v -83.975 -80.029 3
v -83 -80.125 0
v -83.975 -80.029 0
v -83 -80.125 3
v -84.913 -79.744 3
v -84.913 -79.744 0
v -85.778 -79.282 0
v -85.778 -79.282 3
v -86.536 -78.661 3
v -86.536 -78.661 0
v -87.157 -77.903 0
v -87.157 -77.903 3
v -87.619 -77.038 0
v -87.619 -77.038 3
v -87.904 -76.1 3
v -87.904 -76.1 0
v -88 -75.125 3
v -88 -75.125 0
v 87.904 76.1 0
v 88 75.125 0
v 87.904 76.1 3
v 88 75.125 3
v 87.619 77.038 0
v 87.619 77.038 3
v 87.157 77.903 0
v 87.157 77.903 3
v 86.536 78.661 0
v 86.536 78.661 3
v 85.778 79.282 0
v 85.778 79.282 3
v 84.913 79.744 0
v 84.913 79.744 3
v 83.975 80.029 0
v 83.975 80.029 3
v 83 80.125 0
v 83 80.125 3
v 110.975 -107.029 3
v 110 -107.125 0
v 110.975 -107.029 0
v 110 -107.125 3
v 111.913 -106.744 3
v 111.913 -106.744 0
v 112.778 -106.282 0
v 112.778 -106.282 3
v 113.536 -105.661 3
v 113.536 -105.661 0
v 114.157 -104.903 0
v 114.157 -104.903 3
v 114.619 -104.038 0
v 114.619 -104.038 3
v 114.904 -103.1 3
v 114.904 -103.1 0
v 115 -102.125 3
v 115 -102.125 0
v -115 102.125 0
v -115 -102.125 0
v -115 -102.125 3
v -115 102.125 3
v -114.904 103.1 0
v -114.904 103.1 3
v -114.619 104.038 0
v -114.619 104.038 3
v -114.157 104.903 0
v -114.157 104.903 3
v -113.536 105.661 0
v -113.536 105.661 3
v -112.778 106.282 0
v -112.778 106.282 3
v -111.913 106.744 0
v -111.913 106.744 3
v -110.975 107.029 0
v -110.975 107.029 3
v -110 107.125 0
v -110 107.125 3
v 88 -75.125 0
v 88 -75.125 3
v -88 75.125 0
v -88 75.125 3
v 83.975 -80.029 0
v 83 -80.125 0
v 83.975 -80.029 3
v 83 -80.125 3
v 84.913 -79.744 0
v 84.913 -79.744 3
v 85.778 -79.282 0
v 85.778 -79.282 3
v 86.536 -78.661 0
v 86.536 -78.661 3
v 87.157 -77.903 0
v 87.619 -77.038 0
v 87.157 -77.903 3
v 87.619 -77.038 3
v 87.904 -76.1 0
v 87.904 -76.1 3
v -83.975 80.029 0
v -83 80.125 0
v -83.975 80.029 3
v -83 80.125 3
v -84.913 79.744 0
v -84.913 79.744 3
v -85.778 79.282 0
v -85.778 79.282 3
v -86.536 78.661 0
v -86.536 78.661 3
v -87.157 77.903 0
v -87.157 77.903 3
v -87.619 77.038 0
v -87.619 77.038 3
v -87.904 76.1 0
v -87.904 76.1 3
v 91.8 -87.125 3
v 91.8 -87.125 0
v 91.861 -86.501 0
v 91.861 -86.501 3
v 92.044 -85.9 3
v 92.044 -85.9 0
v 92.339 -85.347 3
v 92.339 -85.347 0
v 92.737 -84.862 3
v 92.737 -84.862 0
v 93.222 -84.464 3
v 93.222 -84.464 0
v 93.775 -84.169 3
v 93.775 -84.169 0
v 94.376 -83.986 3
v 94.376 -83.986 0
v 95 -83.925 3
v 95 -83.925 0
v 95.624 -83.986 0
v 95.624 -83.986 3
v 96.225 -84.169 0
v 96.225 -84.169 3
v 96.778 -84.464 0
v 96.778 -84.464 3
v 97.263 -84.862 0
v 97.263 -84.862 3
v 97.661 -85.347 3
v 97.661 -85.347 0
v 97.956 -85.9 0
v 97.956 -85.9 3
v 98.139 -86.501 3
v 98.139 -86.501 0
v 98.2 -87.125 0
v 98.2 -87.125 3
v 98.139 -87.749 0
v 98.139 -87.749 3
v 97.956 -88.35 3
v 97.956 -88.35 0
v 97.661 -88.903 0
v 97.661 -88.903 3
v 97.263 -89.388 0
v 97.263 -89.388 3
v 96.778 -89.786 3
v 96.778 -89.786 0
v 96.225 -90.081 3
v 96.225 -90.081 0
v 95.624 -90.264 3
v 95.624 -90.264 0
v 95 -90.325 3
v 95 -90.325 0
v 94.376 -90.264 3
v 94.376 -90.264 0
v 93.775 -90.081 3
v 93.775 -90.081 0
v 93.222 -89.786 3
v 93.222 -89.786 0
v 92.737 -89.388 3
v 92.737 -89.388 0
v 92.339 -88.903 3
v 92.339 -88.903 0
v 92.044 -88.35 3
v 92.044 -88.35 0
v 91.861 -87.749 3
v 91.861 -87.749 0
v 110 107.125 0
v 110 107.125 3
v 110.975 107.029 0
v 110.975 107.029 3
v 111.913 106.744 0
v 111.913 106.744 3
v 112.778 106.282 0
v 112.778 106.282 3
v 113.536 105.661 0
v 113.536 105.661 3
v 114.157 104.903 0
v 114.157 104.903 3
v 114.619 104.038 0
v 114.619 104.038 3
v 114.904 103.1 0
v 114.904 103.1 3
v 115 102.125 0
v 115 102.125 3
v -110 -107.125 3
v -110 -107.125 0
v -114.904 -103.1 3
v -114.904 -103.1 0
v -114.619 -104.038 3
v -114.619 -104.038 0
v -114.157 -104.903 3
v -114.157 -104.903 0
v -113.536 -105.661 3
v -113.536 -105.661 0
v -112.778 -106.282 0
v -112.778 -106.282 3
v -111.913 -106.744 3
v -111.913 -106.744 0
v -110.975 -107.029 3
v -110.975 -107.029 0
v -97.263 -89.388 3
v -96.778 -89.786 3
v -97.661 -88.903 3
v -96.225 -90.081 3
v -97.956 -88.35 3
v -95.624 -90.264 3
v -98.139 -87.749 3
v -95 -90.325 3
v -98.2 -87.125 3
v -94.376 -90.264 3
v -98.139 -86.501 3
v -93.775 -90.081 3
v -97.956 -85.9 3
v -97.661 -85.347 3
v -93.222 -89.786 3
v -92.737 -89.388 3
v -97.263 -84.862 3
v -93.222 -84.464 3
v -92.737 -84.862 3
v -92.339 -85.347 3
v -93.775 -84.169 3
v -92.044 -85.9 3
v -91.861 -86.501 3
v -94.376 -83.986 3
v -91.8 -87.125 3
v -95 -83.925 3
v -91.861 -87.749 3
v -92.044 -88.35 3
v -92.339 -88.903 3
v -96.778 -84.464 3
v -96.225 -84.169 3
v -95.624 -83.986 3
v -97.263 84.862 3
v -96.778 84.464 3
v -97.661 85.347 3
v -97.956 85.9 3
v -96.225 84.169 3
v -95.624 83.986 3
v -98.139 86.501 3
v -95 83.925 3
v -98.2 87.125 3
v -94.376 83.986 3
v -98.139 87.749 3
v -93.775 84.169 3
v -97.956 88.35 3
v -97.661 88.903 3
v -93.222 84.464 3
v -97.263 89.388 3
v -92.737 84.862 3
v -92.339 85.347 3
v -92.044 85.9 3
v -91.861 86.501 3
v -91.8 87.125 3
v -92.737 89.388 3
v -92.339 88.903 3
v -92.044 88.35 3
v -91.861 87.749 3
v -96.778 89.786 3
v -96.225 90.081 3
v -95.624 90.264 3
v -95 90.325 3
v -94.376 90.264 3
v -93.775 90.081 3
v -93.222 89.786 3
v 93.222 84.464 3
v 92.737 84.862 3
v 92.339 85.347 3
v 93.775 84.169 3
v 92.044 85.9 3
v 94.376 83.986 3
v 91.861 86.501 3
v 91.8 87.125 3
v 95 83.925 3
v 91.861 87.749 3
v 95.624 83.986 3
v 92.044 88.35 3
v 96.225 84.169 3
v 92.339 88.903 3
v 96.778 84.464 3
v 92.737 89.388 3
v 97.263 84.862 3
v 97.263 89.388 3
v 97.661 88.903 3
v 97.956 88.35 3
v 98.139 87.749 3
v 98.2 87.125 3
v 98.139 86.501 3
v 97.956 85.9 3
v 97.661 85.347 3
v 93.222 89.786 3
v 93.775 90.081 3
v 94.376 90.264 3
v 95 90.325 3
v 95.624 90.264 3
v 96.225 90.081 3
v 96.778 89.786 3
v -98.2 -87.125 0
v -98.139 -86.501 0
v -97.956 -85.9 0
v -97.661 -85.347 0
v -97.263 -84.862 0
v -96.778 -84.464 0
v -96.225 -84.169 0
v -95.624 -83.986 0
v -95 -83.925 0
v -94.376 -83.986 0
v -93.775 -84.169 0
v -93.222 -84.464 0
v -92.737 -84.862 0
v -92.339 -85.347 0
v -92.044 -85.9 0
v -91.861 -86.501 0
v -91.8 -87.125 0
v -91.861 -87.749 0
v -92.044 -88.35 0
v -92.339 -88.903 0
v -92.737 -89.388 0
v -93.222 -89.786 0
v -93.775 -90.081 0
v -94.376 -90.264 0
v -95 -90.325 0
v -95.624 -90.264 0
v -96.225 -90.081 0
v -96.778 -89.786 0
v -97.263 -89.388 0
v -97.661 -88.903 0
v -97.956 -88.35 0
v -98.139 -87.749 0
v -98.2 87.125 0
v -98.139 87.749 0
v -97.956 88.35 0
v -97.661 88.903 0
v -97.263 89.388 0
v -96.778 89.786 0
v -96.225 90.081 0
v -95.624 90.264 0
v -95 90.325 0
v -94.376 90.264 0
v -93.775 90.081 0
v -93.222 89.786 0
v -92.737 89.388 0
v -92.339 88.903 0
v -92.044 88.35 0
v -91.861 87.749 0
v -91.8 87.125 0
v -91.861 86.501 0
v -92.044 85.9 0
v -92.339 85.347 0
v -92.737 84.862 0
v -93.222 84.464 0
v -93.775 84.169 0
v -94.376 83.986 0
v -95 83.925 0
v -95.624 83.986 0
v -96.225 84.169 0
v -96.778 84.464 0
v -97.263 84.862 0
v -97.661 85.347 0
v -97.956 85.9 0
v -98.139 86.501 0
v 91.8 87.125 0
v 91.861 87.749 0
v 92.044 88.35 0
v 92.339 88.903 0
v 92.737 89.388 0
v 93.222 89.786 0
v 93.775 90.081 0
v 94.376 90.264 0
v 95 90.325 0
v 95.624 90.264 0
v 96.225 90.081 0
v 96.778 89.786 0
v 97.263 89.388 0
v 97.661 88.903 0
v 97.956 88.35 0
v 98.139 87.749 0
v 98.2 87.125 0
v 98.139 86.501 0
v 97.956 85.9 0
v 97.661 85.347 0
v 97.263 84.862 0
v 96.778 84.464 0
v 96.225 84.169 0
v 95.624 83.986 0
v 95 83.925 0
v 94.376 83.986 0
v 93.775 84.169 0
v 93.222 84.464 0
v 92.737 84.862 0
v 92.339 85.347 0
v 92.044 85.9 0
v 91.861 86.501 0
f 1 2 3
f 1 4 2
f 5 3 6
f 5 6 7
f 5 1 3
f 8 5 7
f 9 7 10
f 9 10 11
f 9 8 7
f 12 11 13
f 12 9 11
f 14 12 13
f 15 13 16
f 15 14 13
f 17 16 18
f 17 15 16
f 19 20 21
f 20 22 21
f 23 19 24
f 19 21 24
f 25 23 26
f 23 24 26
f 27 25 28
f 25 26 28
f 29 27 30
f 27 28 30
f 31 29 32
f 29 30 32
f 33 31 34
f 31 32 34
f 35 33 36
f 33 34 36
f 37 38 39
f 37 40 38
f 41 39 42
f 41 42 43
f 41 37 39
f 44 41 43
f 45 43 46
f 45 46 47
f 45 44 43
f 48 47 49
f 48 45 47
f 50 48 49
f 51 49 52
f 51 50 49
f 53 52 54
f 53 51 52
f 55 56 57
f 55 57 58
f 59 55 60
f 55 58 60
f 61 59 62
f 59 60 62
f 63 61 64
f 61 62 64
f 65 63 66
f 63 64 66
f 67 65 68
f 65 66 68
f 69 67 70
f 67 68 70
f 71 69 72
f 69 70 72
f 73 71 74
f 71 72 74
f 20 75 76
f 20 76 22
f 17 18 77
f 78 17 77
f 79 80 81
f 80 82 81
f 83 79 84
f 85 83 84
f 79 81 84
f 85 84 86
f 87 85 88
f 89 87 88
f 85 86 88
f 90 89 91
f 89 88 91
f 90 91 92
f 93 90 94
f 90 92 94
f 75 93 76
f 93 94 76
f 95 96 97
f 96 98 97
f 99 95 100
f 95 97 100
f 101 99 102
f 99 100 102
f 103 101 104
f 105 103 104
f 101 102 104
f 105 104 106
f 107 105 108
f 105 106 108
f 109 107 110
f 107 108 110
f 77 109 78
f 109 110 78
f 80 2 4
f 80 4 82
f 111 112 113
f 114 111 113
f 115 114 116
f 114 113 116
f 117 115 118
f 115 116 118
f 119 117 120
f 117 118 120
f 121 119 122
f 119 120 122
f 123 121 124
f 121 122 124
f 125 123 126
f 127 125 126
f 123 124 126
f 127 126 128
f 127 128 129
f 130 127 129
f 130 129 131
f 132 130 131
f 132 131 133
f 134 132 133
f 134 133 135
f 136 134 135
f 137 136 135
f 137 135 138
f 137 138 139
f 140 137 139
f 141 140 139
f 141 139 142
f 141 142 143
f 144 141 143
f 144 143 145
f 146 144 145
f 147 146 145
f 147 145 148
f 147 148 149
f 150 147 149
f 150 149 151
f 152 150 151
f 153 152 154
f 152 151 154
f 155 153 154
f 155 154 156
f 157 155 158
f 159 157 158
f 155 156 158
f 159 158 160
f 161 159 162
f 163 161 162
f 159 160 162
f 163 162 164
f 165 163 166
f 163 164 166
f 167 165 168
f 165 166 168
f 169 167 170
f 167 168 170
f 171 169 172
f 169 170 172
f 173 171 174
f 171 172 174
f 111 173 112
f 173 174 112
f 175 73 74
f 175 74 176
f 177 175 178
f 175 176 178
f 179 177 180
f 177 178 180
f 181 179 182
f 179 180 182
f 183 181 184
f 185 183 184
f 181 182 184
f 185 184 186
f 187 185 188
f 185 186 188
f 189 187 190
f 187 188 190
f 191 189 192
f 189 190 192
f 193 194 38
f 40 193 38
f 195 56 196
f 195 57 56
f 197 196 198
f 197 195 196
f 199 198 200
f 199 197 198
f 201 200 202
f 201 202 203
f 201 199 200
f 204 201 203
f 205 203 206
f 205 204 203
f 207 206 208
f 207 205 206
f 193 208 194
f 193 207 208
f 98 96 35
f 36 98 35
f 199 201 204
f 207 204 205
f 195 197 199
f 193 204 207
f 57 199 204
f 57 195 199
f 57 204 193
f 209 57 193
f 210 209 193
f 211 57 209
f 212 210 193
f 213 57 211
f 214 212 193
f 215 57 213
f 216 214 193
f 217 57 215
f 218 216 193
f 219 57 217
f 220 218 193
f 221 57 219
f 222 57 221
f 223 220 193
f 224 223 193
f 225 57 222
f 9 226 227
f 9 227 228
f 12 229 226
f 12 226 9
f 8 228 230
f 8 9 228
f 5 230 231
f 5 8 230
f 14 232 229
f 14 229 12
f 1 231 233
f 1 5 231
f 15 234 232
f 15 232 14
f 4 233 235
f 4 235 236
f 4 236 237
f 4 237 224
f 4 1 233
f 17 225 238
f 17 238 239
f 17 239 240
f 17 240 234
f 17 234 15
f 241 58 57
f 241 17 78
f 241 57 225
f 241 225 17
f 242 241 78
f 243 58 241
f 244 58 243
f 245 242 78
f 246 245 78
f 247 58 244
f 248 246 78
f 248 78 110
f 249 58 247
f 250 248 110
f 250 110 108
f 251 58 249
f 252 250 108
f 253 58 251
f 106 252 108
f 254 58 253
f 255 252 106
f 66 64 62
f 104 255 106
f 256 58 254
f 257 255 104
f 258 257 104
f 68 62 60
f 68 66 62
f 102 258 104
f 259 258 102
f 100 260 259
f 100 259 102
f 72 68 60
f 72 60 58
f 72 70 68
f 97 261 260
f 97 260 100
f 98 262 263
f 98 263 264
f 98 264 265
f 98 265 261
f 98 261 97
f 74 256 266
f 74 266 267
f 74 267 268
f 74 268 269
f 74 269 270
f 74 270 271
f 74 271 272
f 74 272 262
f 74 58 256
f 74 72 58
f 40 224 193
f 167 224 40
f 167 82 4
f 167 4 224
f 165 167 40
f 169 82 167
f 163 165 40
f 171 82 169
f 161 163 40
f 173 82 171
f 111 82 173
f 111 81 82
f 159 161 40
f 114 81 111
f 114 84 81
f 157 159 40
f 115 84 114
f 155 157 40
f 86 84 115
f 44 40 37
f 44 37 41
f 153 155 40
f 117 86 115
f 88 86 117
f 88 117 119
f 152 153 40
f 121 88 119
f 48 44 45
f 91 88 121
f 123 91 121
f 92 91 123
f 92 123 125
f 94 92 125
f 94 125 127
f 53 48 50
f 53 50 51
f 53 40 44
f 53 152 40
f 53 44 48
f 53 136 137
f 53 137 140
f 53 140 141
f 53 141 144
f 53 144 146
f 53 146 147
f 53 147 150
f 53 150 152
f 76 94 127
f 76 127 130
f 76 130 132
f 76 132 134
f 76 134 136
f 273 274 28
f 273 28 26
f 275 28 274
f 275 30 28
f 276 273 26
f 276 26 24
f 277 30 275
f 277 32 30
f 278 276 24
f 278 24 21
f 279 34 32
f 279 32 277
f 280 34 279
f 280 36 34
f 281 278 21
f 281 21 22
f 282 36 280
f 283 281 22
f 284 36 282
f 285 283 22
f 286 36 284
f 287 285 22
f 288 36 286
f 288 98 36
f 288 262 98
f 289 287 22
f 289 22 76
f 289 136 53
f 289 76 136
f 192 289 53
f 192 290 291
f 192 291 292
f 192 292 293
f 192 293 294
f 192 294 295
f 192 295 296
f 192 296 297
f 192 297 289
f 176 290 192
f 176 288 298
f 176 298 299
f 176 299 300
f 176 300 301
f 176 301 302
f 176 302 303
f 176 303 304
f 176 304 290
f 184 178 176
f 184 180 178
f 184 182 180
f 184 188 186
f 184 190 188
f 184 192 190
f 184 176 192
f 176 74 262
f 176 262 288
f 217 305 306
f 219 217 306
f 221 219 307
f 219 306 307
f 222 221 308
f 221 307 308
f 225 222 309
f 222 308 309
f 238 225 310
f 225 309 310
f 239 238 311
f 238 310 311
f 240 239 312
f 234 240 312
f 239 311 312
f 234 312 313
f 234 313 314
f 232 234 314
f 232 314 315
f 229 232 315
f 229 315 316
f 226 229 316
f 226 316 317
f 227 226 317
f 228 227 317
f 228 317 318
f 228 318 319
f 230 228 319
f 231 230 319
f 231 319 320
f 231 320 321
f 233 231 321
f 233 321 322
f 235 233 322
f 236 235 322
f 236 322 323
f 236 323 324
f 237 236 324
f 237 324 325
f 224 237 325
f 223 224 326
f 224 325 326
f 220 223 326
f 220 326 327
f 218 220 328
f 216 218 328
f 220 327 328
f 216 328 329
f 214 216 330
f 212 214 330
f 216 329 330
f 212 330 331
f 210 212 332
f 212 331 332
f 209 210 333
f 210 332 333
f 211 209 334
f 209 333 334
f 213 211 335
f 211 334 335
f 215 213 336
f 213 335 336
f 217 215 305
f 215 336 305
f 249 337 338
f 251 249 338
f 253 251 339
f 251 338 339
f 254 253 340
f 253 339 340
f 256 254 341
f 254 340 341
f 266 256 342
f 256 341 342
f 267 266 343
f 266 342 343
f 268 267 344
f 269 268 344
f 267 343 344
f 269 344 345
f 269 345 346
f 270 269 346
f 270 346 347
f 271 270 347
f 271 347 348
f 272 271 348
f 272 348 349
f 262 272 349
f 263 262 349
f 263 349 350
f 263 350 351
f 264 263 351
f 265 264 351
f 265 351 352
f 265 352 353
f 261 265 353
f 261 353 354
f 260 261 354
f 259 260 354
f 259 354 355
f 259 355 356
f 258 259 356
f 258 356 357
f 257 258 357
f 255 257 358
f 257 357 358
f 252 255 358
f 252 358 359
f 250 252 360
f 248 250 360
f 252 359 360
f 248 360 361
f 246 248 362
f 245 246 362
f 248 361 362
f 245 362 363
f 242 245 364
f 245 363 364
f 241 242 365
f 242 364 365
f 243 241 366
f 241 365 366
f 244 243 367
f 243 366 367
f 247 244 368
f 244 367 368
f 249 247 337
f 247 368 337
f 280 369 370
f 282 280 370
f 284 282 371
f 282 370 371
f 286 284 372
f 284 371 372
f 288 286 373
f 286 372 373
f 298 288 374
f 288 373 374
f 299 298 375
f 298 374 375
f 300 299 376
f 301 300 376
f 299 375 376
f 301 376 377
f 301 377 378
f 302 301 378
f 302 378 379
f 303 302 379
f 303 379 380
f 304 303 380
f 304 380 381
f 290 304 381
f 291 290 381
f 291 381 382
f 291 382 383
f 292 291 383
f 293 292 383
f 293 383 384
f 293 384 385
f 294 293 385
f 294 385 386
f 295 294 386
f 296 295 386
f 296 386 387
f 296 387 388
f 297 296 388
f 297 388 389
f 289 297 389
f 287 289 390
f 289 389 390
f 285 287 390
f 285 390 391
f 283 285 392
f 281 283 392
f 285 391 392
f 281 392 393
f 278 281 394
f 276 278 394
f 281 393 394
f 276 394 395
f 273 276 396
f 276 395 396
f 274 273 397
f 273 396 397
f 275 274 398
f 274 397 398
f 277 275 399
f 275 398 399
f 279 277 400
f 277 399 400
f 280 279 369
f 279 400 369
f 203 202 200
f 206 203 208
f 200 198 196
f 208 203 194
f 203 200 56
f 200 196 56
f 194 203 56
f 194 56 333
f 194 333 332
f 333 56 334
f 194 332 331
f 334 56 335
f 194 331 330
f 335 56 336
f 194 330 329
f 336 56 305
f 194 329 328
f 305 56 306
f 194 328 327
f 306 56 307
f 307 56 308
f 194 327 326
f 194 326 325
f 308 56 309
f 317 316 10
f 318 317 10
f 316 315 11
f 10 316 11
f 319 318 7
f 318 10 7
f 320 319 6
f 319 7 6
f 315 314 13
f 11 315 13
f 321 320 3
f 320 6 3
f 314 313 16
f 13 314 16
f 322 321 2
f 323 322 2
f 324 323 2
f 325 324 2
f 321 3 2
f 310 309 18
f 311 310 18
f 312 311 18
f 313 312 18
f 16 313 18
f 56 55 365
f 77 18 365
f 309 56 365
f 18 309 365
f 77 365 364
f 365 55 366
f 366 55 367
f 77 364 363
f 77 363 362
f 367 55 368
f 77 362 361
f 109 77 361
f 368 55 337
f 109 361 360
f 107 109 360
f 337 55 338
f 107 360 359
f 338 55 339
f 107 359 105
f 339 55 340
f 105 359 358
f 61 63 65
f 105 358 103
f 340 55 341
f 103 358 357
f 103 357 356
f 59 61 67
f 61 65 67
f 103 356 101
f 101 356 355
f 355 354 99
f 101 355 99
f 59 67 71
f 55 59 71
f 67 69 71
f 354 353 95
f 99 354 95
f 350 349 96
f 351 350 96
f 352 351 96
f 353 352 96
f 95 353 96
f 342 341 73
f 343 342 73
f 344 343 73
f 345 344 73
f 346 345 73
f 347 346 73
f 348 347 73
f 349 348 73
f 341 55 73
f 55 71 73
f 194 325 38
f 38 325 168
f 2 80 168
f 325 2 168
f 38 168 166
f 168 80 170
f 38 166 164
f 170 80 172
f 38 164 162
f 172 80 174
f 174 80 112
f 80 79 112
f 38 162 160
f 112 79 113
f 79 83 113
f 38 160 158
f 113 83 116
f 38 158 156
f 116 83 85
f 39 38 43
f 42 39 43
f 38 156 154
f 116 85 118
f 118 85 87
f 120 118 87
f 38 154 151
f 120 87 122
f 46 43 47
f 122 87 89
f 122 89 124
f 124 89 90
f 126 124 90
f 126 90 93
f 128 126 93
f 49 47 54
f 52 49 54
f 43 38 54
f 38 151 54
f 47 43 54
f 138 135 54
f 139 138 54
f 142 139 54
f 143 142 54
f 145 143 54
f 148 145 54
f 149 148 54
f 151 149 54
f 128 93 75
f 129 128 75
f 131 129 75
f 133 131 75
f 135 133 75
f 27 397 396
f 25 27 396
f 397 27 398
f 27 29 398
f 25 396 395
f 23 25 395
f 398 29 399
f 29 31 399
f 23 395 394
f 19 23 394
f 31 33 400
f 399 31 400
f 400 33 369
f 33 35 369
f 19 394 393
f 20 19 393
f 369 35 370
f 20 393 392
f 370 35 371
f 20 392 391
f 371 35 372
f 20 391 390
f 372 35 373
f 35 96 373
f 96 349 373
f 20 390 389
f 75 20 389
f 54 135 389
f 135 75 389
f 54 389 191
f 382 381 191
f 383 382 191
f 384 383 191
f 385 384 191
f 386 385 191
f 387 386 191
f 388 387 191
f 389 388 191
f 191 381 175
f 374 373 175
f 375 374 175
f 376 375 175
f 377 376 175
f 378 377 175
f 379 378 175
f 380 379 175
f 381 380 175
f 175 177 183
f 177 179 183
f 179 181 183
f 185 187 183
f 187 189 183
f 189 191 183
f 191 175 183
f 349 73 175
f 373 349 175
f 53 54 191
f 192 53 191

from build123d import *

# Parameters (mm, degrees)
SKETCH_1_W                  = 230
SKETCH_1_H                  = 214.25
SKETCH_1_W_2                = 176
SKETCH_1_H_2                = 160.25
EXTRUDE_1_DEPTH             = 3
FILLET_1_R                  = 5
HOLE_WIZARD_6_4_6_4_1_D     = 6.4
HOLE_WIZARD_6_4_6_4_1_DEPTH = 3


with BuildPart() as part:
    # 草图1 → 凸台-拉伸1 (new body)
    with BuildSketch(Plane.XY):
        Rectangle(SKETCH_1_W, SKETCH_1_H)
        Rectangle(SKETCH_1_W_2, SKETCH_1_H_2, mode=Mode.SUBTRACT)
    extrude(amount=EXTRUDE_1_DEPTH)

    # 圆角1
    fillet_1_edges = [part.edges().sort_by_distance(p)[0] for p in [
        (-88, 80.125, 1.5),
        (-88, -80.125, 1.5),
        (88, -80.125, 1.5),
        (88, 80.125, 1.5),
        (-115, 107.125, 1.5),
        (115, 107.125, 1.5),
        (115, -107.125, 1.5),
        (-115, -107.125, 1.5),
    ]]
    fillet(fillet_1_edges, radius=FILLET_1_R)

    # Ø6.4 (6.4) 直径孔1
    with Locations(Plane.XY.offset(3)):
        with Locations((-95, 87.125), (95, 87.125), (95, -87.125), (-95, -87.125)):
            Hole(HOLE_WIZARD_6_4_6_4_1_D / 2, depth=HOLE_WIZARD_6_4_6_4_1_DEPTH)


solid = part.part
